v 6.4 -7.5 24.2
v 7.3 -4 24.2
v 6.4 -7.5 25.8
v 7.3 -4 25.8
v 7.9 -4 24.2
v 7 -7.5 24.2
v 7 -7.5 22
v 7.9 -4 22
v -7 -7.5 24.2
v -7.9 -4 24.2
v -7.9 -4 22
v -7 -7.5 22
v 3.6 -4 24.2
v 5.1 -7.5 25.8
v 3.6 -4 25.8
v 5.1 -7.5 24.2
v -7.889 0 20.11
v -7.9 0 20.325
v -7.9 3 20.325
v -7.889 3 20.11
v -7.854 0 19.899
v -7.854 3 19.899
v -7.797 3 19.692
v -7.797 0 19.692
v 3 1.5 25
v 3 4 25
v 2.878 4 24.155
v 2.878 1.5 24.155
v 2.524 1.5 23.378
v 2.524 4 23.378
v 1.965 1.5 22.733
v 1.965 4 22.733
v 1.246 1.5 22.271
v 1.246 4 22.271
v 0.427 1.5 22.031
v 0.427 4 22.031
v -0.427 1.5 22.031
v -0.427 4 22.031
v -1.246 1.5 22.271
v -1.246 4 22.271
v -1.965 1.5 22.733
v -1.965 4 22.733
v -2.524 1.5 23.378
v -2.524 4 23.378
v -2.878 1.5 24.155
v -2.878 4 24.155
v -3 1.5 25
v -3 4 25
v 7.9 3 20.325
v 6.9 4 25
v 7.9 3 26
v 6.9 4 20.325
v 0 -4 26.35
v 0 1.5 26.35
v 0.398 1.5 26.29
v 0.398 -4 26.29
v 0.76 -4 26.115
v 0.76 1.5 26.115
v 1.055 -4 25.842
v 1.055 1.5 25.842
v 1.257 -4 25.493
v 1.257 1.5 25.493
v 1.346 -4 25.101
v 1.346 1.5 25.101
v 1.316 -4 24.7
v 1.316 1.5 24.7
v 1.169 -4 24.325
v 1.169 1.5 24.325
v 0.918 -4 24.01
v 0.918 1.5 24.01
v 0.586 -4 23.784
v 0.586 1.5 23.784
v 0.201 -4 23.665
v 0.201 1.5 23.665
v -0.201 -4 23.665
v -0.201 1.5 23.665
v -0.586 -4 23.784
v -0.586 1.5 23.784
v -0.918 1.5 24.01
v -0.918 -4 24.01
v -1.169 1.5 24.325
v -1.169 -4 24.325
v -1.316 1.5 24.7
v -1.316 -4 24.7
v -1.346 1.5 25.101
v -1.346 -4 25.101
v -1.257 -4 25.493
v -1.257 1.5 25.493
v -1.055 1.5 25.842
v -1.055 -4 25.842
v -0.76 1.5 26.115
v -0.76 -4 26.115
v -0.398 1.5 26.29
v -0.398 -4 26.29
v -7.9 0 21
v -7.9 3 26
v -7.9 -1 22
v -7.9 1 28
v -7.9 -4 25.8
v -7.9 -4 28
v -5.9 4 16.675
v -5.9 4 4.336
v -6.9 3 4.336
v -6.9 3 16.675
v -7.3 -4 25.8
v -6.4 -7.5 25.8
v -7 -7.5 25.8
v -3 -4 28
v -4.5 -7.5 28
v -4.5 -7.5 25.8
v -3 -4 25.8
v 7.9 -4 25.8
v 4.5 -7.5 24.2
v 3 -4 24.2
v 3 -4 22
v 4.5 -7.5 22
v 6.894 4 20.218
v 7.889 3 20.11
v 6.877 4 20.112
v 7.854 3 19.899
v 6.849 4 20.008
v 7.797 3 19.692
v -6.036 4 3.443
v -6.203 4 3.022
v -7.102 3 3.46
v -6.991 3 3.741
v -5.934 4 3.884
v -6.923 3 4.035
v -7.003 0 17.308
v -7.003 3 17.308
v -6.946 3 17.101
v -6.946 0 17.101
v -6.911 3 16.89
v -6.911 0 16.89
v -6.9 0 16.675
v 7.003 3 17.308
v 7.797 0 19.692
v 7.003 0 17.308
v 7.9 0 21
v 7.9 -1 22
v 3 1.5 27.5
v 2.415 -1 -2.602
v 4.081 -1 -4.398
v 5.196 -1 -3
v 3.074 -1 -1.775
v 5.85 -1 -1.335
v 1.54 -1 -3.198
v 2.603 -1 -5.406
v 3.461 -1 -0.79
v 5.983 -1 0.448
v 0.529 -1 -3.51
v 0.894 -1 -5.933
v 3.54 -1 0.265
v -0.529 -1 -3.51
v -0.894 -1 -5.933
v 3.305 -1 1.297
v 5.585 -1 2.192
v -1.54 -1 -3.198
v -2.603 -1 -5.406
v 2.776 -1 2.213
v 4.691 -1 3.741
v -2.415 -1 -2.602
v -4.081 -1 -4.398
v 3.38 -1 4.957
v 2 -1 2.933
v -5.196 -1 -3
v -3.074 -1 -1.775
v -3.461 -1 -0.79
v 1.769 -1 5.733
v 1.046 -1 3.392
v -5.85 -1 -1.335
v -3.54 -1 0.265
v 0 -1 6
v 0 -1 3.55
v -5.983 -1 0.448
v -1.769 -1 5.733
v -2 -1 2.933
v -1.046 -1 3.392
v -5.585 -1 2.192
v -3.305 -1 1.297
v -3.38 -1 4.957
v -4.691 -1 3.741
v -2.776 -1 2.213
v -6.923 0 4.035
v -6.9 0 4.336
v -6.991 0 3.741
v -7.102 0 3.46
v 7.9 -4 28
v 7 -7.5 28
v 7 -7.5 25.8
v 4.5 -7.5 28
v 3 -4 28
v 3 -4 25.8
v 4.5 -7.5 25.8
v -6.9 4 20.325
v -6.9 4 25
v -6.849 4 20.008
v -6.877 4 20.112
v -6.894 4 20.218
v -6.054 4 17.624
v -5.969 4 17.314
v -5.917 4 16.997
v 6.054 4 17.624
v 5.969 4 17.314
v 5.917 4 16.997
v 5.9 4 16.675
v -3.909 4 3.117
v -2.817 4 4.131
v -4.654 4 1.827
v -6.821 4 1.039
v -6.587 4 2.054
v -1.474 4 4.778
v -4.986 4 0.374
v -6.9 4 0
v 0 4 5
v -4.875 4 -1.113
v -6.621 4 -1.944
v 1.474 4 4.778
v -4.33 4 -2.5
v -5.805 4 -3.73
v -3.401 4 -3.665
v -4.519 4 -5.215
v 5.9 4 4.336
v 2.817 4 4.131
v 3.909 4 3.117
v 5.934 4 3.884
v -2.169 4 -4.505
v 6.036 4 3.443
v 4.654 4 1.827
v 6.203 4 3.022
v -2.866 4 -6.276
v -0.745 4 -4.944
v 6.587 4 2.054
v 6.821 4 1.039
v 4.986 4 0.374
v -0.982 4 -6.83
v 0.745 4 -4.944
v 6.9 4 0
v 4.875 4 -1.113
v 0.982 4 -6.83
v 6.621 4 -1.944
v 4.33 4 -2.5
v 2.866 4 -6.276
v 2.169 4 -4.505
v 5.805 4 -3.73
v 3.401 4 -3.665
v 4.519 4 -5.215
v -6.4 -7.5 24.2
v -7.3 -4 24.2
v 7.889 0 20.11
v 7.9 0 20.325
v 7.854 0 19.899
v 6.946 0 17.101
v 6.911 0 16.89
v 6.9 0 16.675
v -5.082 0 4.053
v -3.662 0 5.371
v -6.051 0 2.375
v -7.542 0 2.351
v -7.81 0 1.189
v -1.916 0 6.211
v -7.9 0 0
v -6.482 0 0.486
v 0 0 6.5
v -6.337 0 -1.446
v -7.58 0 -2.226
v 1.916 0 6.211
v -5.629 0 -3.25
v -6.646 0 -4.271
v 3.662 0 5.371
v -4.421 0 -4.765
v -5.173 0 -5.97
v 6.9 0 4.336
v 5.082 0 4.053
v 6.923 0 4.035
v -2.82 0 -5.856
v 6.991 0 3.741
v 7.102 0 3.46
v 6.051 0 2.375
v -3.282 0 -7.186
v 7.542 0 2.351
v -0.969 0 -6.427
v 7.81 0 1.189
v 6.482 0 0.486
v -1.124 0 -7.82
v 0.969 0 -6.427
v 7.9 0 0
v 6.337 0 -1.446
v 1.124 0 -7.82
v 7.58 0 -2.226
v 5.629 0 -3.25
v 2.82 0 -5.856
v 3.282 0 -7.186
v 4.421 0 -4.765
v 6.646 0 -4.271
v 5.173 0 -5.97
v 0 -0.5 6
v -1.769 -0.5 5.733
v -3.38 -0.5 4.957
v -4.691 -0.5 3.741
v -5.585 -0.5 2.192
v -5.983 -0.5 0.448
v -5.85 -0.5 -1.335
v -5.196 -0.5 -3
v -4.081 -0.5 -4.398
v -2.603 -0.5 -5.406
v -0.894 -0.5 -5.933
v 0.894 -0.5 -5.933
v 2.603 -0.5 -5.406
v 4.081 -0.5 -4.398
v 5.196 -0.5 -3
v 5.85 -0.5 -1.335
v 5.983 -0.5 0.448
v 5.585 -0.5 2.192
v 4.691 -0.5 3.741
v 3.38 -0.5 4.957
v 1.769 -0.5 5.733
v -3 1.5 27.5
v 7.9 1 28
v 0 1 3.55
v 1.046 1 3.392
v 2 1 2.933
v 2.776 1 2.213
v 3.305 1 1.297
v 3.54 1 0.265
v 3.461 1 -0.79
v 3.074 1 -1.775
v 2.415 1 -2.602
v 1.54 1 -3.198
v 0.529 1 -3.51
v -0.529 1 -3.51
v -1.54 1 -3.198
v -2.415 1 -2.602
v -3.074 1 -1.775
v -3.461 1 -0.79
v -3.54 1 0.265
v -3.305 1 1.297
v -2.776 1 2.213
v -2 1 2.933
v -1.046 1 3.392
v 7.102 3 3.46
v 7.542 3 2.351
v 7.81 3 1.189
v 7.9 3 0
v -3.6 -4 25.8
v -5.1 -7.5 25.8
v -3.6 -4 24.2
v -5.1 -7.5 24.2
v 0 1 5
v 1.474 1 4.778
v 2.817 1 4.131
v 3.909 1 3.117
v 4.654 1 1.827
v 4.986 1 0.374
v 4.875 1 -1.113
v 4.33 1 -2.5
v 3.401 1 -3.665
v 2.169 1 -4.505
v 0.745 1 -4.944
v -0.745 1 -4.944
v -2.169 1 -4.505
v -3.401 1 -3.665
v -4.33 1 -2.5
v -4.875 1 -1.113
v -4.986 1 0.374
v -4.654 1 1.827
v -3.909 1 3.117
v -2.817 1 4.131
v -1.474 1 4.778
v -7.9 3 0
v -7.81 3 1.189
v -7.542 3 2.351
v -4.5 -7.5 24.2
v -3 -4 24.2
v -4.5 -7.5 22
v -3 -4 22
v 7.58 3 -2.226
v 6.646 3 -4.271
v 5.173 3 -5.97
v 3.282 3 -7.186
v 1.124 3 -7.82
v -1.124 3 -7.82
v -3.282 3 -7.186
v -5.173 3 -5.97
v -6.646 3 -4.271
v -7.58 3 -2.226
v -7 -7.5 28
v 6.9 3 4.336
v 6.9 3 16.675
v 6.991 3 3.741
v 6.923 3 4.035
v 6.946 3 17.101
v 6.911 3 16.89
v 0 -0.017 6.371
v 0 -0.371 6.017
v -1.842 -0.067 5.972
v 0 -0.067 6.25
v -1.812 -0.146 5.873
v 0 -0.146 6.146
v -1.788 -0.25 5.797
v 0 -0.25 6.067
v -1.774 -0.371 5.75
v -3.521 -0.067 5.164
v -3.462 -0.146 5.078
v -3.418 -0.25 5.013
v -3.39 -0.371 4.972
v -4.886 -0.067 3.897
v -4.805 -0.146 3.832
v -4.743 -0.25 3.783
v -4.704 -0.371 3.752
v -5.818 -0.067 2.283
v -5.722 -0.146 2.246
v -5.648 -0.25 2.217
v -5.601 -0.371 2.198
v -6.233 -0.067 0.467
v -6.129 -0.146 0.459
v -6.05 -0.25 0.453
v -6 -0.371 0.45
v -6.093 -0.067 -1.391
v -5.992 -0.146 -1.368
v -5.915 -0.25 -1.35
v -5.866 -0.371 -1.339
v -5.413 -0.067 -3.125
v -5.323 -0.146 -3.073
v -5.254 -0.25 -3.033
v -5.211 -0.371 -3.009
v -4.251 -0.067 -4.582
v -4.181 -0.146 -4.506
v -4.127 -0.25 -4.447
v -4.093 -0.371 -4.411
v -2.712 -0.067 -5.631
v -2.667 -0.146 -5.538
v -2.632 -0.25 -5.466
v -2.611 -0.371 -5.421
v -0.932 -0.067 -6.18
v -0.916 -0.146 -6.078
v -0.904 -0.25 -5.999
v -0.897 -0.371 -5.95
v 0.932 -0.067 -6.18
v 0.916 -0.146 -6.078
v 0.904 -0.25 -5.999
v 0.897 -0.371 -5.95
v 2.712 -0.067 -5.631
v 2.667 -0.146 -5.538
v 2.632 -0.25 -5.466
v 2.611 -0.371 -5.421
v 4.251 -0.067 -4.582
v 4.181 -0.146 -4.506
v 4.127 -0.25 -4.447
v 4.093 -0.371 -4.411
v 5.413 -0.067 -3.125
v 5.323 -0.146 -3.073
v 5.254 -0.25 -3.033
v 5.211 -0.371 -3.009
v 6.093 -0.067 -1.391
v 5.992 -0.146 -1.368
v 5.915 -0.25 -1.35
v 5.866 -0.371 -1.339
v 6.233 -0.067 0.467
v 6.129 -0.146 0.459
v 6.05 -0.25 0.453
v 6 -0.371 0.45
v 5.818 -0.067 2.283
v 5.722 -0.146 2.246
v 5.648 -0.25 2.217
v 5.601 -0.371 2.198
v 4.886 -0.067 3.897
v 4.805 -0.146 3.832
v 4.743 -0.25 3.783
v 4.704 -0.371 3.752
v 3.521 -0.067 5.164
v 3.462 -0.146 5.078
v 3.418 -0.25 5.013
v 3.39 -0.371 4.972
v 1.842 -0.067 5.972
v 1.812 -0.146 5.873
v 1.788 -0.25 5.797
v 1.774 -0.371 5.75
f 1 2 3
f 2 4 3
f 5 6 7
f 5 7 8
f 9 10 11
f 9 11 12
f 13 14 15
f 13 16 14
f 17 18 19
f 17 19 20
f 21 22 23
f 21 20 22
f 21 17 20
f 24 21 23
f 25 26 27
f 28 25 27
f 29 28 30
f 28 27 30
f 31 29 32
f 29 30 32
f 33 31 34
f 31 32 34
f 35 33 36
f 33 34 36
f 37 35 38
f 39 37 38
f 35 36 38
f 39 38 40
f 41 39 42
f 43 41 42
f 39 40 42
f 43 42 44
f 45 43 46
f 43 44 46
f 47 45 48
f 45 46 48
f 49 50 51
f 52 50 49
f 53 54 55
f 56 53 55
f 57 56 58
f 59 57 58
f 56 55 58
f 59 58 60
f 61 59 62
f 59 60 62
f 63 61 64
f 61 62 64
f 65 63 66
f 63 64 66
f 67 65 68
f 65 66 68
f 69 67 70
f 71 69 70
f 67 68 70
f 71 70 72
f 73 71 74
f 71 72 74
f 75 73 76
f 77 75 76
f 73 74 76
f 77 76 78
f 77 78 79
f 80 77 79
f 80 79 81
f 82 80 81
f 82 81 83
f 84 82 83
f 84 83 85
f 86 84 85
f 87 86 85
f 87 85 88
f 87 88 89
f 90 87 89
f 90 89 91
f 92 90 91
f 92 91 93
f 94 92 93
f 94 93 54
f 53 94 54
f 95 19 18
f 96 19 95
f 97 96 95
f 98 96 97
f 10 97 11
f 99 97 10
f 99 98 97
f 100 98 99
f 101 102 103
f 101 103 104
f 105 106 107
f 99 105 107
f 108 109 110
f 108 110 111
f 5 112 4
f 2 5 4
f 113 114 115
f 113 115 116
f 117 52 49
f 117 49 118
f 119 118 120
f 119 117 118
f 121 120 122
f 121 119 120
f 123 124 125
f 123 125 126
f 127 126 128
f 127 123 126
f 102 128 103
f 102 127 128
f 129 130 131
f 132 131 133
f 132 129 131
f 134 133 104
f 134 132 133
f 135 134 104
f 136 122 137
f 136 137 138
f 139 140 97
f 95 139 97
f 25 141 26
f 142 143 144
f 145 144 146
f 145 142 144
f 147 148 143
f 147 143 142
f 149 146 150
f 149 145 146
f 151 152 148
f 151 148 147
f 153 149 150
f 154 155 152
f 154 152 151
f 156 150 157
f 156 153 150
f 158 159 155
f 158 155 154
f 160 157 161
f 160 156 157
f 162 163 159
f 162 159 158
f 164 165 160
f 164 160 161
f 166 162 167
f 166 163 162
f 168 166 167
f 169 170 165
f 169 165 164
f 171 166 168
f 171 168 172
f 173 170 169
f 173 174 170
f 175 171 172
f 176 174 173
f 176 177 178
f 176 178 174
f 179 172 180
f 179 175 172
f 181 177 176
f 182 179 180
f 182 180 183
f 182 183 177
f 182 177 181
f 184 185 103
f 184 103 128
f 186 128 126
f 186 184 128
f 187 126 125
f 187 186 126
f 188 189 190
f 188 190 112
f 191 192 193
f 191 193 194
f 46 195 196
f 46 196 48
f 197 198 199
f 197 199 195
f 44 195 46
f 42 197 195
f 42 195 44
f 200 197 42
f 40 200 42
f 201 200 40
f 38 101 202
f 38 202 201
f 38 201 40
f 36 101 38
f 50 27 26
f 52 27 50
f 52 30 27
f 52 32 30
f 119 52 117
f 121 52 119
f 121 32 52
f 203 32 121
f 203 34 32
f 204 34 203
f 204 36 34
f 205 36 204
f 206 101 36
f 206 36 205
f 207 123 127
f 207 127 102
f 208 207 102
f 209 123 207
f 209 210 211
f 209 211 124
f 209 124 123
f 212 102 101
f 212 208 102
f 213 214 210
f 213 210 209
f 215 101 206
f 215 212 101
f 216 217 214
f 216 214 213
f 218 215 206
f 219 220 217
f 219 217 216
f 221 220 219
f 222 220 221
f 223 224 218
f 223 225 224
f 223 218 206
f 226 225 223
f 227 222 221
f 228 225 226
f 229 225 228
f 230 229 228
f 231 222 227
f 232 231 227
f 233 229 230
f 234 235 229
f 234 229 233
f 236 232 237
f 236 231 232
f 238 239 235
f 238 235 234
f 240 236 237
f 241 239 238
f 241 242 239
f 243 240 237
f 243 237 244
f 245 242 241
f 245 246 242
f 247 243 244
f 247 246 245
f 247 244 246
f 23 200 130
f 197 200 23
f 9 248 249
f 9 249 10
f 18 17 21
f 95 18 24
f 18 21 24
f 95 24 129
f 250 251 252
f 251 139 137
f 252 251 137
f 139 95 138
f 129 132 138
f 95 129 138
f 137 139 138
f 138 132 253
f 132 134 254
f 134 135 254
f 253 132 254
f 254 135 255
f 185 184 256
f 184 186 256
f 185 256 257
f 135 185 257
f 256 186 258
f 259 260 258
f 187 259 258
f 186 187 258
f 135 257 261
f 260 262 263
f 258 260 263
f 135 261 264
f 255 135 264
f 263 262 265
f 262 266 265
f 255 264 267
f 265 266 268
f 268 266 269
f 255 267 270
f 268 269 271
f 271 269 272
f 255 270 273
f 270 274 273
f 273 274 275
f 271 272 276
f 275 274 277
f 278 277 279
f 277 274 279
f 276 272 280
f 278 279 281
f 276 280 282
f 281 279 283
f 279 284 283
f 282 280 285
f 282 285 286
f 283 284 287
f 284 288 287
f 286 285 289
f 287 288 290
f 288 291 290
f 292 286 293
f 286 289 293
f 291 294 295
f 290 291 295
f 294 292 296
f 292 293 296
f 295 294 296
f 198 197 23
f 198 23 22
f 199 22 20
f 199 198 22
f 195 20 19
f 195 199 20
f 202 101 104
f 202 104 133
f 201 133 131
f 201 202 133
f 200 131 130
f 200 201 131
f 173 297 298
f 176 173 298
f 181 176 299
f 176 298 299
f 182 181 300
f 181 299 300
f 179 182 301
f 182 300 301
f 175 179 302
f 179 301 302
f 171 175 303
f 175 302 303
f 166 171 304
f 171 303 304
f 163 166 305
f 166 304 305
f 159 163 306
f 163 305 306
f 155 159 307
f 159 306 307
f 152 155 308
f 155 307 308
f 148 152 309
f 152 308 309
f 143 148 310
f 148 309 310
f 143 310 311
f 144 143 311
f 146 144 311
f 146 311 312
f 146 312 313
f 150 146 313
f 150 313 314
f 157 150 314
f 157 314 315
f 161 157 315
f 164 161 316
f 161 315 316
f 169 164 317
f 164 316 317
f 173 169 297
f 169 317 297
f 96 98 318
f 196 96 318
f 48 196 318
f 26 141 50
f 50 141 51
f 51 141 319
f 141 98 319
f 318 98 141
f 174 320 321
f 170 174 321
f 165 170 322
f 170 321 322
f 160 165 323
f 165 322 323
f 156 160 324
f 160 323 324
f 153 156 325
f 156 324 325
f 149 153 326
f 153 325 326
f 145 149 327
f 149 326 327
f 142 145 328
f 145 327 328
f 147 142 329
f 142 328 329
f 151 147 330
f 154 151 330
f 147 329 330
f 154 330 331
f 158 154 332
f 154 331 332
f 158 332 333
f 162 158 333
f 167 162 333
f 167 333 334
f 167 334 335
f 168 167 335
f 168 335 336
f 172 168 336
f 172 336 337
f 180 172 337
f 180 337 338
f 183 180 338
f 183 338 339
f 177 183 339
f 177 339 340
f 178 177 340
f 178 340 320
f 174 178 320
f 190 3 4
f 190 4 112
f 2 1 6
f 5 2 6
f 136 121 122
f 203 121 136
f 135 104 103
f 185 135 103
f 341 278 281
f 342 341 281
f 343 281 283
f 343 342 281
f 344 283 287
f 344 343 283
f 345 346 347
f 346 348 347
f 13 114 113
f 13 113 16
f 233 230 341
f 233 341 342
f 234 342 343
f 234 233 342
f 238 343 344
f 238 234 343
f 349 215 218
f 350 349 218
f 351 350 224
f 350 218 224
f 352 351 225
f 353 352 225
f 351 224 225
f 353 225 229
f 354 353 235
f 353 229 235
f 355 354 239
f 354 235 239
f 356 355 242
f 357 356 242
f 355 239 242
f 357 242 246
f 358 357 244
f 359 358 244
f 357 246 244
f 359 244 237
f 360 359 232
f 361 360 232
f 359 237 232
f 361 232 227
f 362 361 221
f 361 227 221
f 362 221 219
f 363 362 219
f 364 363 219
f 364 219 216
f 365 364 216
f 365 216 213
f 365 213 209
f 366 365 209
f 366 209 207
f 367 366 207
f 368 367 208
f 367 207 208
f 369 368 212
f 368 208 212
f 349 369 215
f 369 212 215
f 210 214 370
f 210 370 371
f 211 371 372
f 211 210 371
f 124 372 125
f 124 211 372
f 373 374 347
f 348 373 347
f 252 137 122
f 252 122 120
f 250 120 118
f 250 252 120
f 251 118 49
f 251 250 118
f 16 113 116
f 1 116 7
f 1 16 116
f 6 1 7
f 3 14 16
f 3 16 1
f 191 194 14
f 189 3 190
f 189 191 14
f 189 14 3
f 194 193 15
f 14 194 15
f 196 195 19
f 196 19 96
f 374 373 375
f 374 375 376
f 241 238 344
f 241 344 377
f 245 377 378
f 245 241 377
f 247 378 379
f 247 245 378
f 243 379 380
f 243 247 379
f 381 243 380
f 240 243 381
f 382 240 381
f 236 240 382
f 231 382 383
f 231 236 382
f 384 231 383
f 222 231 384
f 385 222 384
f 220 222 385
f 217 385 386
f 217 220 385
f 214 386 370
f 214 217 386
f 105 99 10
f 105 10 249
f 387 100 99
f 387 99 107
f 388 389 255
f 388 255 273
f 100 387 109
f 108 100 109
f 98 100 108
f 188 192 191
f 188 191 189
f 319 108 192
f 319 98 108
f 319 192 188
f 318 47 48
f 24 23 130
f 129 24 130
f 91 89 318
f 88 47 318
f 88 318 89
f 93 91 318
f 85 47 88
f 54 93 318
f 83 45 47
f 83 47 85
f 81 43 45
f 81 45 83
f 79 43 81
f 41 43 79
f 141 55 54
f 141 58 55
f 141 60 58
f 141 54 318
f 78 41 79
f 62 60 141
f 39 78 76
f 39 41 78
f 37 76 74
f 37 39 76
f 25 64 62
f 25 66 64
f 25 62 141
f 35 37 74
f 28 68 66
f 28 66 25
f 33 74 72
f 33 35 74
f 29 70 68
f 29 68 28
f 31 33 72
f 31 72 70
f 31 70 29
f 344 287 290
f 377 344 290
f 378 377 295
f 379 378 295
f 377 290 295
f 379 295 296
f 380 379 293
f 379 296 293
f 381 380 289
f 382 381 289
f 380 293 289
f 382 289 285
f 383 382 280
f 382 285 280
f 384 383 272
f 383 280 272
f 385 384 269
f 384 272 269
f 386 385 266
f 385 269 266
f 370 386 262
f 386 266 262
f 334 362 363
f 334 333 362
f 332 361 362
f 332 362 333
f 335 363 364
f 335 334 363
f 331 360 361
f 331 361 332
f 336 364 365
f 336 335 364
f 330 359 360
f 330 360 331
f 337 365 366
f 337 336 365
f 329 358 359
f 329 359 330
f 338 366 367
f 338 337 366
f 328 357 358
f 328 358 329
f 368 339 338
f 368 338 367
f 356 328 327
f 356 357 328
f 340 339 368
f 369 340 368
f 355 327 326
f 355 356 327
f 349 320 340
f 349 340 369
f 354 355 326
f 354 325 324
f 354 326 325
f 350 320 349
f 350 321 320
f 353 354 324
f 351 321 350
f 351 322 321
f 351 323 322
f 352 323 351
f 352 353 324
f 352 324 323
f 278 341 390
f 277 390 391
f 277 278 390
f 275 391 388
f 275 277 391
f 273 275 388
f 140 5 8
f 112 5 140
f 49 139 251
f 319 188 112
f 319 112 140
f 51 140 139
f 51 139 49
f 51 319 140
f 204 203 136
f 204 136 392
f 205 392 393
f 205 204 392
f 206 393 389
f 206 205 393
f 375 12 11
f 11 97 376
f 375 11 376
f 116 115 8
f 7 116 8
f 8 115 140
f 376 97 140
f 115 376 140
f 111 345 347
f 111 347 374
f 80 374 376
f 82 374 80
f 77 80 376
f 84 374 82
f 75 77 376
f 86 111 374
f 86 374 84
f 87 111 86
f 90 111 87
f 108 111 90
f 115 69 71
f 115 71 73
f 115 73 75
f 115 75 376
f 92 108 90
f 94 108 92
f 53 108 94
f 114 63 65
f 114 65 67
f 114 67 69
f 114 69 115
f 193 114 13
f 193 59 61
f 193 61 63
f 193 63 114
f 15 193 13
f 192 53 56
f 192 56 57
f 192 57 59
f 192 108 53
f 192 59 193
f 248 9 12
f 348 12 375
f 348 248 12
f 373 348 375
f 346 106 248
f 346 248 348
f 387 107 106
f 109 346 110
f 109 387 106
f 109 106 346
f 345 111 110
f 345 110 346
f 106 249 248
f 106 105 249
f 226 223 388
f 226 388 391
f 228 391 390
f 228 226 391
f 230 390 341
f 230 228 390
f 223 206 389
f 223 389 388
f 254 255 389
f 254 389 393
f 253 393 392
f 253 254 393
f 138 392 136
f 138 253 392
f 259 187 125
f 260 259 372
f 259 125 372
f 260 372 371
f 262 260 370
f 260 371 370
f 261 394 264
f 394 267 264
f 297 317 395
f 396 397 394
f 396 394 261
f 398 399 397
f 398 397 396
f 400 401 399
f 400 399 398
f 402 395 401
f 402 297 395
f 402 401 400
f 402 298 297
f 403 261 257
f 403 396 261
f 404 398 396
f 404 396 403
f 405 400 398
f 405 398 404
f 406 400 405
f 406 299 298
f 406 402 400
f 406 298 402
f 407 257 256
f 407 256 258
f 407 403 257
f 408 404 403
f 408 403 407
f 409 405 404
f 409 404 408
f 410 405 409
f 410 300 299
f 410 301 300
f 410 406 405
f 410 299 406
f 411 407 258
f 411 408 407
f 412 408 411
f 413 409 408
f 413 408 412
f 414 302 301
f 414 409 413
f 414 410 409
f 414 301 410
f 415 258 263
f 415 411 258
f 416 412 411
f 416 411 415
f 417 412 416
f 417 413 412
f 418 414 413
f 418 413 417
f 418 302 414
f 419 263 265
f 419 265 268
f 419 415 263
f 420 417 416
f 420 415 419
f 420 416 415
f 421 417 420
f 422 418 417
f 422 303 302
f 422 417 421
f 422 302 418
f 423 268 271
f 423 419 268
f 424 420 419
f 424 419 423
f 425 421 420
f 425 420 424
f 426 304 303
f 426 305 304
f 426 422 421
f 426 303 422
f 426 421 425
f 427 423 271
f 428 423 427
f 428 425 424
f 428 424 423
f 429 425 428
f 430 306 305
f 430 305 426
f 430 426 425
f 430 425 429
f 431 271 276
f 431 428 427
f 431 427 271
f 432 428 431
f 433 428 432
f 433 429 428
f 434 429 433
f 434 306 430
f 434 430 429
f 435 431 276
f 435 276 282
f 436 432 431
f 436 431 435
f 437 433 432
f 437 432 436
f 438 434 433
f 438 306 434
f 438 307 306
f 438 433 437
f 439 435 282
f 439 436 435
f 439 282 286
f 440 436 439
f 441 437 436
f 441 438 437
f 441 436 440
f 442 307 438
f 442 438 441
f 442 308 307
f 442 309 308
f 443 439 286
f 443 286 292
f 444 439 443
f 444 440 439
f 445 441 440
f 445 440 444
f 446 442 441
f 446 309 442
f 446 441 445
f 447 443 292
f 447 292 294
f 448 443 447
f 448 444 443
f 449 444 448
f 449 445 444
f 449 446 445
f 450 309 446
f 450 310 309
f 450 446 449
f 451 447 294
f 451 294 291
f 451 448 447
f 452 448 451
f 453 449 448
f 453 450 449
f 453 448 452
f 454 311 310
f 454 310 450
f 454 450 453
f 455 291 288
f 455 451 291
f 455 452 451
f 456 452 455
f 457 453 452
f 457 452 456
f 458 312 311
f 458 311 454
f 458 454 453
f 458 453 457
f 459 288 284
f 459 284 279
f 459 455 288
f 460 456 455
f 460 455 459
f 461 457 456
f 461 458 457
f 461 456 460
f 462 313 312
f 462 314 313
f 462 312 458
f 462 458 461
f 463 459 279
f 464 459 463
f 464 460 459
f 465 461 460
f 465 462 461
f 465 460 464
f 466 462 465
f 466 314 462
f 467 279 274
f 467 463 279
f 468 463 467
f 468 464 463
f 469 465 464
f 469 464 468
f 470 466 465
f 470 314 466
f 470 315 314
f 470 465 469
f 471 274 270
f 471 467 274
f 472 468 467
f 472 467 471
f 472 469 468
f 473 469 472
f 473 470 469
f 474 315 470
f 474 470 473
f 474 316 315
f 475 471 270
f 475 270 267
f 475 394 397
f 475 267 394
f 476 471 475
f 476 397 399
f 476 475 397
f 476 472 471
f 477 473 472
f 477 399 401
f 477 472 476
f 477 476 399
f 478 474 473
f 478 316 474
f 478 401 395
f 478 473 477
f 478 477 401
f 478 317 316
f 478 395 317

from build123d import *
from build123d.topology import SkipClean

# Parameters (mm, degrees)
EXTRUDE_1_DEPTH     = 4
EXTRUDE_3_DEPTH     = 6
CHAMFER_1_SIZE      = 3
CUT_EXTRUDE_2_DEPTH = 2.5
CUT_EXTRUDE_3_REACH = 32.453
SKETCH_7_R          = 1.35
SKETCH_8_R          = 6
EXTRUDE_4_DEPTH     = 1
FILLET_1_R          = 0.5
SKETCH_9_R          = 5
CUT_EXTRUDE_4_DEPTH = 3
SKETCH_10_R         = 3.55
CUT_EXTRUDE_5_DEPTH = 3.6
CUT_EXTRUDE_6_DEPTH = 0.8
CUT_EXTRUDE_7_DEPTH = 32.283541999
FILLET_2_R          = 2
CHAMFER_2_SIZE      = 1


with BuildPart() as part:
    # ｽｹｯﾁ1 → ﾎﾞｽ - 押し出し1 (new body)
    with BuildSketch(Plane(origin=(0, 0, 0), x_dir=(1, 0, 0), z_dir=(0, 1, 0))):
        with BuildLine():
            Line((-7.9, 0), (-7.9, -28))
            Line((-7.9, -28), (7.9, -28))
            Line((7.9, -28), (7.9, 0))
            ThreePointArc((7.9, 0), (0, 7.9), (-7.9, 0))
        make_face()
    extrude(amount=EXTRUDE_1_DEPTH)

    # ｽｹｯﾁ4 → ﾎﾞｽ - 押し出し3 (add)
    with BuildSketch(Plane.XY.offset(28)):
        Polygon((-7, -7.5), (-4.5, -7.5), (-3, -4), (3, -4), (4.5, -7.5), (7, -7.5), (7.9, -4), (7.9, 0), (-7.9, 0), (-7.9, -4), align=None)
    extrude(amount=-EXTRUDE_3_DEPTH)

    # 面取り1
    chamfer_1_edges = [part.edges().sort_by_distance(p)[0] for p in [
        (0, 4, 28),
    ]]
    chamfer(chamfer_1_edges, length=CHAMFER_1_SIZE)

    # ｽｹｯﾁ6 → ｶｯﾄ - 押し出し2 (cut)
    with BuildSketch(Plane(origin=(0, 4, 0), x_dir=(1, 0, 0), z_dir=(0, 1, 0))):
        with BuildLine():
            Line((-3, -25), (-3, -29))
            Line((-3, -29), (3, -29))
            Line((3, -29), (3, -25))
            ThreePointArc((3, -25), (0, -22), (-3, -25))
        make_face()
    extrude(amount=-CUT_EXTRUDE_2_DEPTH, mode=Mode.SUBTRACT)

    # ｽｹｯﾁ7 → ｶｯﾄ - 押し出し3 (cut, up to next)
    with BuildSketch(Plane(origin=(0, 1.5, 0), x_dir=(1, 0, 0), z_dir=(0, 1, 0)), mode=Mode.PRIVATE) as cut_extrude_3_sk1:
        with Locations(Location((0, -25, 0), (0, 0, 270))):
            Circle(SKETCH_7_R)
    cut_extrude_3_tool1 = extrude(cut_extrude_3_sk1.sketch, amount=-CUT_EXTRUDE_3_REACH, mode=Mode.PRIVATE) & part.part
    add(cut_extrude_3_tool1.solids().sort_by_distance((0, 1.5, 25))[0], mode=Mode.SUBTRACT)

    # ｽｹｯﾁ8 → ﾎﾞｽ - 押し出し4 (add)
    with BuildSketch(Plane.XZ):
        with Locations(Location((0, 0, 0), (0, 0, 90))):
            Circle(SKETCH_8_R)
    extrude(amount=EXTRUDE_4_DEPTH)

    # ﾌｨﾚｯﾄ1
    fillet_1_edges = [part.edges().sort_by_distance(p)[0] for p in [
        (0, 0, -6),
    ]]
    fillet(fillet_1_edges, radius=FILLET_1_R)

    # ｽｹｯﾁ9 → ｶｯﾄ - 押し出し4 (cut)
    with BuildSketch(Plane(origin=(0, 4, 0), x_dir=(1, 0, 0), z_dir=(0, 1, 0))):
        with Locations(Location((0, 0, 0), (0, 0, 270))):
            Circle(SKETCH_9_R)
    extrude(amount=-CUT_EXTRUDE_4_DEPTH, mode=Mode.SUBTRACT)

    # ｽｹｯﾁ10 → ｶｯﾄ - 押し出し5 (cut)
    with BuildSketch(Plane(origin=(0, 1, 0), x_dir=(1, 0, 0), z_dir=(0, 1, 0))):
        with Locations(Location((0, 0, 0), (0, 0, 270))):
            Circle(SKETCH_10_R)
    extrude(amount=-CUT_EXTRUDE_5_DEPTH, mode=Mode.SUBTRACT)

    # ｽｹｯﾁ11 → ｶｯﾄ - 押し出し6 (cut, symmetric)
    with BuildSketch(Plane.XY.offset(25)):
        Polygon((3, -4), (4.5, -7.5), (5.1, -7.5), (3.6, -4), align=None)
        Polygon((6.4, -7.5), (7, -7.5), (7.9, -4), (7.3, -4), align=None)
    cut_extrude_6 = extrude(amount=CUT_EXTRUDE_6_DEPTH, both=True, mode=Mode.SUBTRACT)

    # ﾐﾗｰ1: ｶｯﾄ - 押し出し6 across plane
    add(cut_extrude_6.mirror(Plane(origin=(0, 0, 0), x_dir=(0, 0, 1), z_dir=(1, 0, 0))), mode=Mode.SUBTRACT)

    # ｽｹｯﾁ12 → ｶｯﾄ - 押し出し7 (cut, through all)
    with SkipClean():  # the faces are left unmerged after this step: merging them gives an invalid solid
        with BuildSketch(Plane(origin=(0, 4, 0), x_dir=(1, 0, 0), z_dir=(0, 1, 0))):
            with BuildLine():
                Line((-7.9, 0), (-7.9, -20))
                Line((-7.9, -20), (-6.9, -17))
                Line((-6.9, -17), (-6.9, -3.847076812))
                ThreePointArc((-6.9, -3.847076812), (-7.645913941, -1.987460691), (-7.9, 0))
            make_face()
        cut_extrude_7 = extrude(amount=-CUT_EXTRUDE_7_DEPTH, mode=Mode.SUBTRACT)

    # ﾐﾗｰ2: ｶｯﾄ - 押し出し7 across plane
    with SkipClean():  # the faces are left unmerged after this step: merging them gives an invalid solid
        add(cut_extrude_7.mirror(Plane(origin=(0, 0, 0), x_dir=(0, 0, 1), z_dir=(1, 0, 0))), mode=Mode.SUBTRACT)

    # ﾌｨﾚｯﾄ2
    fillet_2_edges = [part.edges().sort_by_distance(p)[0] for p in [
        (-6.9, 2, 3.847076812),
        (-6.9, 2, 17),
        (-7.9, 2, 20),
        (6.9, 2, 3.847076812),
        (7.9, 2, 20),
        (6.9, 2, 17),
    ]]
    fillet(fillet_2_edges, radius=FILLET_2_R)

    # 面取り2
    chamfer_2_edges = [part.edges().sort_by_distance(p)[0] for p in [
        (-7.9, 4, 22.66227766),
        (0, 4, -7.9),
        (7.9, 4, 22.66227766),
        (0, 0, 22),
        (-7.874174915, 4, 20.004190834),
        (-7.4, 4, 18.5),
        (-6.925825085, 4, 16.995809166),
        (-6.9, 4, 10.505670679),
        (-6.951159371, 4, 3.886430103),
        (6.951159371, 4, 3.886430103),
        (6.9, 4, 10.505670679),
        (6.925825085, 4, 16.995809166),
        (7.4, 4, 18.5),
        (7.874174915, 4, 20.004190834),
    ]]
    chamfer(chamfer_2_edges, length=CHAMFER_2_SIZE)


solid = part.part
